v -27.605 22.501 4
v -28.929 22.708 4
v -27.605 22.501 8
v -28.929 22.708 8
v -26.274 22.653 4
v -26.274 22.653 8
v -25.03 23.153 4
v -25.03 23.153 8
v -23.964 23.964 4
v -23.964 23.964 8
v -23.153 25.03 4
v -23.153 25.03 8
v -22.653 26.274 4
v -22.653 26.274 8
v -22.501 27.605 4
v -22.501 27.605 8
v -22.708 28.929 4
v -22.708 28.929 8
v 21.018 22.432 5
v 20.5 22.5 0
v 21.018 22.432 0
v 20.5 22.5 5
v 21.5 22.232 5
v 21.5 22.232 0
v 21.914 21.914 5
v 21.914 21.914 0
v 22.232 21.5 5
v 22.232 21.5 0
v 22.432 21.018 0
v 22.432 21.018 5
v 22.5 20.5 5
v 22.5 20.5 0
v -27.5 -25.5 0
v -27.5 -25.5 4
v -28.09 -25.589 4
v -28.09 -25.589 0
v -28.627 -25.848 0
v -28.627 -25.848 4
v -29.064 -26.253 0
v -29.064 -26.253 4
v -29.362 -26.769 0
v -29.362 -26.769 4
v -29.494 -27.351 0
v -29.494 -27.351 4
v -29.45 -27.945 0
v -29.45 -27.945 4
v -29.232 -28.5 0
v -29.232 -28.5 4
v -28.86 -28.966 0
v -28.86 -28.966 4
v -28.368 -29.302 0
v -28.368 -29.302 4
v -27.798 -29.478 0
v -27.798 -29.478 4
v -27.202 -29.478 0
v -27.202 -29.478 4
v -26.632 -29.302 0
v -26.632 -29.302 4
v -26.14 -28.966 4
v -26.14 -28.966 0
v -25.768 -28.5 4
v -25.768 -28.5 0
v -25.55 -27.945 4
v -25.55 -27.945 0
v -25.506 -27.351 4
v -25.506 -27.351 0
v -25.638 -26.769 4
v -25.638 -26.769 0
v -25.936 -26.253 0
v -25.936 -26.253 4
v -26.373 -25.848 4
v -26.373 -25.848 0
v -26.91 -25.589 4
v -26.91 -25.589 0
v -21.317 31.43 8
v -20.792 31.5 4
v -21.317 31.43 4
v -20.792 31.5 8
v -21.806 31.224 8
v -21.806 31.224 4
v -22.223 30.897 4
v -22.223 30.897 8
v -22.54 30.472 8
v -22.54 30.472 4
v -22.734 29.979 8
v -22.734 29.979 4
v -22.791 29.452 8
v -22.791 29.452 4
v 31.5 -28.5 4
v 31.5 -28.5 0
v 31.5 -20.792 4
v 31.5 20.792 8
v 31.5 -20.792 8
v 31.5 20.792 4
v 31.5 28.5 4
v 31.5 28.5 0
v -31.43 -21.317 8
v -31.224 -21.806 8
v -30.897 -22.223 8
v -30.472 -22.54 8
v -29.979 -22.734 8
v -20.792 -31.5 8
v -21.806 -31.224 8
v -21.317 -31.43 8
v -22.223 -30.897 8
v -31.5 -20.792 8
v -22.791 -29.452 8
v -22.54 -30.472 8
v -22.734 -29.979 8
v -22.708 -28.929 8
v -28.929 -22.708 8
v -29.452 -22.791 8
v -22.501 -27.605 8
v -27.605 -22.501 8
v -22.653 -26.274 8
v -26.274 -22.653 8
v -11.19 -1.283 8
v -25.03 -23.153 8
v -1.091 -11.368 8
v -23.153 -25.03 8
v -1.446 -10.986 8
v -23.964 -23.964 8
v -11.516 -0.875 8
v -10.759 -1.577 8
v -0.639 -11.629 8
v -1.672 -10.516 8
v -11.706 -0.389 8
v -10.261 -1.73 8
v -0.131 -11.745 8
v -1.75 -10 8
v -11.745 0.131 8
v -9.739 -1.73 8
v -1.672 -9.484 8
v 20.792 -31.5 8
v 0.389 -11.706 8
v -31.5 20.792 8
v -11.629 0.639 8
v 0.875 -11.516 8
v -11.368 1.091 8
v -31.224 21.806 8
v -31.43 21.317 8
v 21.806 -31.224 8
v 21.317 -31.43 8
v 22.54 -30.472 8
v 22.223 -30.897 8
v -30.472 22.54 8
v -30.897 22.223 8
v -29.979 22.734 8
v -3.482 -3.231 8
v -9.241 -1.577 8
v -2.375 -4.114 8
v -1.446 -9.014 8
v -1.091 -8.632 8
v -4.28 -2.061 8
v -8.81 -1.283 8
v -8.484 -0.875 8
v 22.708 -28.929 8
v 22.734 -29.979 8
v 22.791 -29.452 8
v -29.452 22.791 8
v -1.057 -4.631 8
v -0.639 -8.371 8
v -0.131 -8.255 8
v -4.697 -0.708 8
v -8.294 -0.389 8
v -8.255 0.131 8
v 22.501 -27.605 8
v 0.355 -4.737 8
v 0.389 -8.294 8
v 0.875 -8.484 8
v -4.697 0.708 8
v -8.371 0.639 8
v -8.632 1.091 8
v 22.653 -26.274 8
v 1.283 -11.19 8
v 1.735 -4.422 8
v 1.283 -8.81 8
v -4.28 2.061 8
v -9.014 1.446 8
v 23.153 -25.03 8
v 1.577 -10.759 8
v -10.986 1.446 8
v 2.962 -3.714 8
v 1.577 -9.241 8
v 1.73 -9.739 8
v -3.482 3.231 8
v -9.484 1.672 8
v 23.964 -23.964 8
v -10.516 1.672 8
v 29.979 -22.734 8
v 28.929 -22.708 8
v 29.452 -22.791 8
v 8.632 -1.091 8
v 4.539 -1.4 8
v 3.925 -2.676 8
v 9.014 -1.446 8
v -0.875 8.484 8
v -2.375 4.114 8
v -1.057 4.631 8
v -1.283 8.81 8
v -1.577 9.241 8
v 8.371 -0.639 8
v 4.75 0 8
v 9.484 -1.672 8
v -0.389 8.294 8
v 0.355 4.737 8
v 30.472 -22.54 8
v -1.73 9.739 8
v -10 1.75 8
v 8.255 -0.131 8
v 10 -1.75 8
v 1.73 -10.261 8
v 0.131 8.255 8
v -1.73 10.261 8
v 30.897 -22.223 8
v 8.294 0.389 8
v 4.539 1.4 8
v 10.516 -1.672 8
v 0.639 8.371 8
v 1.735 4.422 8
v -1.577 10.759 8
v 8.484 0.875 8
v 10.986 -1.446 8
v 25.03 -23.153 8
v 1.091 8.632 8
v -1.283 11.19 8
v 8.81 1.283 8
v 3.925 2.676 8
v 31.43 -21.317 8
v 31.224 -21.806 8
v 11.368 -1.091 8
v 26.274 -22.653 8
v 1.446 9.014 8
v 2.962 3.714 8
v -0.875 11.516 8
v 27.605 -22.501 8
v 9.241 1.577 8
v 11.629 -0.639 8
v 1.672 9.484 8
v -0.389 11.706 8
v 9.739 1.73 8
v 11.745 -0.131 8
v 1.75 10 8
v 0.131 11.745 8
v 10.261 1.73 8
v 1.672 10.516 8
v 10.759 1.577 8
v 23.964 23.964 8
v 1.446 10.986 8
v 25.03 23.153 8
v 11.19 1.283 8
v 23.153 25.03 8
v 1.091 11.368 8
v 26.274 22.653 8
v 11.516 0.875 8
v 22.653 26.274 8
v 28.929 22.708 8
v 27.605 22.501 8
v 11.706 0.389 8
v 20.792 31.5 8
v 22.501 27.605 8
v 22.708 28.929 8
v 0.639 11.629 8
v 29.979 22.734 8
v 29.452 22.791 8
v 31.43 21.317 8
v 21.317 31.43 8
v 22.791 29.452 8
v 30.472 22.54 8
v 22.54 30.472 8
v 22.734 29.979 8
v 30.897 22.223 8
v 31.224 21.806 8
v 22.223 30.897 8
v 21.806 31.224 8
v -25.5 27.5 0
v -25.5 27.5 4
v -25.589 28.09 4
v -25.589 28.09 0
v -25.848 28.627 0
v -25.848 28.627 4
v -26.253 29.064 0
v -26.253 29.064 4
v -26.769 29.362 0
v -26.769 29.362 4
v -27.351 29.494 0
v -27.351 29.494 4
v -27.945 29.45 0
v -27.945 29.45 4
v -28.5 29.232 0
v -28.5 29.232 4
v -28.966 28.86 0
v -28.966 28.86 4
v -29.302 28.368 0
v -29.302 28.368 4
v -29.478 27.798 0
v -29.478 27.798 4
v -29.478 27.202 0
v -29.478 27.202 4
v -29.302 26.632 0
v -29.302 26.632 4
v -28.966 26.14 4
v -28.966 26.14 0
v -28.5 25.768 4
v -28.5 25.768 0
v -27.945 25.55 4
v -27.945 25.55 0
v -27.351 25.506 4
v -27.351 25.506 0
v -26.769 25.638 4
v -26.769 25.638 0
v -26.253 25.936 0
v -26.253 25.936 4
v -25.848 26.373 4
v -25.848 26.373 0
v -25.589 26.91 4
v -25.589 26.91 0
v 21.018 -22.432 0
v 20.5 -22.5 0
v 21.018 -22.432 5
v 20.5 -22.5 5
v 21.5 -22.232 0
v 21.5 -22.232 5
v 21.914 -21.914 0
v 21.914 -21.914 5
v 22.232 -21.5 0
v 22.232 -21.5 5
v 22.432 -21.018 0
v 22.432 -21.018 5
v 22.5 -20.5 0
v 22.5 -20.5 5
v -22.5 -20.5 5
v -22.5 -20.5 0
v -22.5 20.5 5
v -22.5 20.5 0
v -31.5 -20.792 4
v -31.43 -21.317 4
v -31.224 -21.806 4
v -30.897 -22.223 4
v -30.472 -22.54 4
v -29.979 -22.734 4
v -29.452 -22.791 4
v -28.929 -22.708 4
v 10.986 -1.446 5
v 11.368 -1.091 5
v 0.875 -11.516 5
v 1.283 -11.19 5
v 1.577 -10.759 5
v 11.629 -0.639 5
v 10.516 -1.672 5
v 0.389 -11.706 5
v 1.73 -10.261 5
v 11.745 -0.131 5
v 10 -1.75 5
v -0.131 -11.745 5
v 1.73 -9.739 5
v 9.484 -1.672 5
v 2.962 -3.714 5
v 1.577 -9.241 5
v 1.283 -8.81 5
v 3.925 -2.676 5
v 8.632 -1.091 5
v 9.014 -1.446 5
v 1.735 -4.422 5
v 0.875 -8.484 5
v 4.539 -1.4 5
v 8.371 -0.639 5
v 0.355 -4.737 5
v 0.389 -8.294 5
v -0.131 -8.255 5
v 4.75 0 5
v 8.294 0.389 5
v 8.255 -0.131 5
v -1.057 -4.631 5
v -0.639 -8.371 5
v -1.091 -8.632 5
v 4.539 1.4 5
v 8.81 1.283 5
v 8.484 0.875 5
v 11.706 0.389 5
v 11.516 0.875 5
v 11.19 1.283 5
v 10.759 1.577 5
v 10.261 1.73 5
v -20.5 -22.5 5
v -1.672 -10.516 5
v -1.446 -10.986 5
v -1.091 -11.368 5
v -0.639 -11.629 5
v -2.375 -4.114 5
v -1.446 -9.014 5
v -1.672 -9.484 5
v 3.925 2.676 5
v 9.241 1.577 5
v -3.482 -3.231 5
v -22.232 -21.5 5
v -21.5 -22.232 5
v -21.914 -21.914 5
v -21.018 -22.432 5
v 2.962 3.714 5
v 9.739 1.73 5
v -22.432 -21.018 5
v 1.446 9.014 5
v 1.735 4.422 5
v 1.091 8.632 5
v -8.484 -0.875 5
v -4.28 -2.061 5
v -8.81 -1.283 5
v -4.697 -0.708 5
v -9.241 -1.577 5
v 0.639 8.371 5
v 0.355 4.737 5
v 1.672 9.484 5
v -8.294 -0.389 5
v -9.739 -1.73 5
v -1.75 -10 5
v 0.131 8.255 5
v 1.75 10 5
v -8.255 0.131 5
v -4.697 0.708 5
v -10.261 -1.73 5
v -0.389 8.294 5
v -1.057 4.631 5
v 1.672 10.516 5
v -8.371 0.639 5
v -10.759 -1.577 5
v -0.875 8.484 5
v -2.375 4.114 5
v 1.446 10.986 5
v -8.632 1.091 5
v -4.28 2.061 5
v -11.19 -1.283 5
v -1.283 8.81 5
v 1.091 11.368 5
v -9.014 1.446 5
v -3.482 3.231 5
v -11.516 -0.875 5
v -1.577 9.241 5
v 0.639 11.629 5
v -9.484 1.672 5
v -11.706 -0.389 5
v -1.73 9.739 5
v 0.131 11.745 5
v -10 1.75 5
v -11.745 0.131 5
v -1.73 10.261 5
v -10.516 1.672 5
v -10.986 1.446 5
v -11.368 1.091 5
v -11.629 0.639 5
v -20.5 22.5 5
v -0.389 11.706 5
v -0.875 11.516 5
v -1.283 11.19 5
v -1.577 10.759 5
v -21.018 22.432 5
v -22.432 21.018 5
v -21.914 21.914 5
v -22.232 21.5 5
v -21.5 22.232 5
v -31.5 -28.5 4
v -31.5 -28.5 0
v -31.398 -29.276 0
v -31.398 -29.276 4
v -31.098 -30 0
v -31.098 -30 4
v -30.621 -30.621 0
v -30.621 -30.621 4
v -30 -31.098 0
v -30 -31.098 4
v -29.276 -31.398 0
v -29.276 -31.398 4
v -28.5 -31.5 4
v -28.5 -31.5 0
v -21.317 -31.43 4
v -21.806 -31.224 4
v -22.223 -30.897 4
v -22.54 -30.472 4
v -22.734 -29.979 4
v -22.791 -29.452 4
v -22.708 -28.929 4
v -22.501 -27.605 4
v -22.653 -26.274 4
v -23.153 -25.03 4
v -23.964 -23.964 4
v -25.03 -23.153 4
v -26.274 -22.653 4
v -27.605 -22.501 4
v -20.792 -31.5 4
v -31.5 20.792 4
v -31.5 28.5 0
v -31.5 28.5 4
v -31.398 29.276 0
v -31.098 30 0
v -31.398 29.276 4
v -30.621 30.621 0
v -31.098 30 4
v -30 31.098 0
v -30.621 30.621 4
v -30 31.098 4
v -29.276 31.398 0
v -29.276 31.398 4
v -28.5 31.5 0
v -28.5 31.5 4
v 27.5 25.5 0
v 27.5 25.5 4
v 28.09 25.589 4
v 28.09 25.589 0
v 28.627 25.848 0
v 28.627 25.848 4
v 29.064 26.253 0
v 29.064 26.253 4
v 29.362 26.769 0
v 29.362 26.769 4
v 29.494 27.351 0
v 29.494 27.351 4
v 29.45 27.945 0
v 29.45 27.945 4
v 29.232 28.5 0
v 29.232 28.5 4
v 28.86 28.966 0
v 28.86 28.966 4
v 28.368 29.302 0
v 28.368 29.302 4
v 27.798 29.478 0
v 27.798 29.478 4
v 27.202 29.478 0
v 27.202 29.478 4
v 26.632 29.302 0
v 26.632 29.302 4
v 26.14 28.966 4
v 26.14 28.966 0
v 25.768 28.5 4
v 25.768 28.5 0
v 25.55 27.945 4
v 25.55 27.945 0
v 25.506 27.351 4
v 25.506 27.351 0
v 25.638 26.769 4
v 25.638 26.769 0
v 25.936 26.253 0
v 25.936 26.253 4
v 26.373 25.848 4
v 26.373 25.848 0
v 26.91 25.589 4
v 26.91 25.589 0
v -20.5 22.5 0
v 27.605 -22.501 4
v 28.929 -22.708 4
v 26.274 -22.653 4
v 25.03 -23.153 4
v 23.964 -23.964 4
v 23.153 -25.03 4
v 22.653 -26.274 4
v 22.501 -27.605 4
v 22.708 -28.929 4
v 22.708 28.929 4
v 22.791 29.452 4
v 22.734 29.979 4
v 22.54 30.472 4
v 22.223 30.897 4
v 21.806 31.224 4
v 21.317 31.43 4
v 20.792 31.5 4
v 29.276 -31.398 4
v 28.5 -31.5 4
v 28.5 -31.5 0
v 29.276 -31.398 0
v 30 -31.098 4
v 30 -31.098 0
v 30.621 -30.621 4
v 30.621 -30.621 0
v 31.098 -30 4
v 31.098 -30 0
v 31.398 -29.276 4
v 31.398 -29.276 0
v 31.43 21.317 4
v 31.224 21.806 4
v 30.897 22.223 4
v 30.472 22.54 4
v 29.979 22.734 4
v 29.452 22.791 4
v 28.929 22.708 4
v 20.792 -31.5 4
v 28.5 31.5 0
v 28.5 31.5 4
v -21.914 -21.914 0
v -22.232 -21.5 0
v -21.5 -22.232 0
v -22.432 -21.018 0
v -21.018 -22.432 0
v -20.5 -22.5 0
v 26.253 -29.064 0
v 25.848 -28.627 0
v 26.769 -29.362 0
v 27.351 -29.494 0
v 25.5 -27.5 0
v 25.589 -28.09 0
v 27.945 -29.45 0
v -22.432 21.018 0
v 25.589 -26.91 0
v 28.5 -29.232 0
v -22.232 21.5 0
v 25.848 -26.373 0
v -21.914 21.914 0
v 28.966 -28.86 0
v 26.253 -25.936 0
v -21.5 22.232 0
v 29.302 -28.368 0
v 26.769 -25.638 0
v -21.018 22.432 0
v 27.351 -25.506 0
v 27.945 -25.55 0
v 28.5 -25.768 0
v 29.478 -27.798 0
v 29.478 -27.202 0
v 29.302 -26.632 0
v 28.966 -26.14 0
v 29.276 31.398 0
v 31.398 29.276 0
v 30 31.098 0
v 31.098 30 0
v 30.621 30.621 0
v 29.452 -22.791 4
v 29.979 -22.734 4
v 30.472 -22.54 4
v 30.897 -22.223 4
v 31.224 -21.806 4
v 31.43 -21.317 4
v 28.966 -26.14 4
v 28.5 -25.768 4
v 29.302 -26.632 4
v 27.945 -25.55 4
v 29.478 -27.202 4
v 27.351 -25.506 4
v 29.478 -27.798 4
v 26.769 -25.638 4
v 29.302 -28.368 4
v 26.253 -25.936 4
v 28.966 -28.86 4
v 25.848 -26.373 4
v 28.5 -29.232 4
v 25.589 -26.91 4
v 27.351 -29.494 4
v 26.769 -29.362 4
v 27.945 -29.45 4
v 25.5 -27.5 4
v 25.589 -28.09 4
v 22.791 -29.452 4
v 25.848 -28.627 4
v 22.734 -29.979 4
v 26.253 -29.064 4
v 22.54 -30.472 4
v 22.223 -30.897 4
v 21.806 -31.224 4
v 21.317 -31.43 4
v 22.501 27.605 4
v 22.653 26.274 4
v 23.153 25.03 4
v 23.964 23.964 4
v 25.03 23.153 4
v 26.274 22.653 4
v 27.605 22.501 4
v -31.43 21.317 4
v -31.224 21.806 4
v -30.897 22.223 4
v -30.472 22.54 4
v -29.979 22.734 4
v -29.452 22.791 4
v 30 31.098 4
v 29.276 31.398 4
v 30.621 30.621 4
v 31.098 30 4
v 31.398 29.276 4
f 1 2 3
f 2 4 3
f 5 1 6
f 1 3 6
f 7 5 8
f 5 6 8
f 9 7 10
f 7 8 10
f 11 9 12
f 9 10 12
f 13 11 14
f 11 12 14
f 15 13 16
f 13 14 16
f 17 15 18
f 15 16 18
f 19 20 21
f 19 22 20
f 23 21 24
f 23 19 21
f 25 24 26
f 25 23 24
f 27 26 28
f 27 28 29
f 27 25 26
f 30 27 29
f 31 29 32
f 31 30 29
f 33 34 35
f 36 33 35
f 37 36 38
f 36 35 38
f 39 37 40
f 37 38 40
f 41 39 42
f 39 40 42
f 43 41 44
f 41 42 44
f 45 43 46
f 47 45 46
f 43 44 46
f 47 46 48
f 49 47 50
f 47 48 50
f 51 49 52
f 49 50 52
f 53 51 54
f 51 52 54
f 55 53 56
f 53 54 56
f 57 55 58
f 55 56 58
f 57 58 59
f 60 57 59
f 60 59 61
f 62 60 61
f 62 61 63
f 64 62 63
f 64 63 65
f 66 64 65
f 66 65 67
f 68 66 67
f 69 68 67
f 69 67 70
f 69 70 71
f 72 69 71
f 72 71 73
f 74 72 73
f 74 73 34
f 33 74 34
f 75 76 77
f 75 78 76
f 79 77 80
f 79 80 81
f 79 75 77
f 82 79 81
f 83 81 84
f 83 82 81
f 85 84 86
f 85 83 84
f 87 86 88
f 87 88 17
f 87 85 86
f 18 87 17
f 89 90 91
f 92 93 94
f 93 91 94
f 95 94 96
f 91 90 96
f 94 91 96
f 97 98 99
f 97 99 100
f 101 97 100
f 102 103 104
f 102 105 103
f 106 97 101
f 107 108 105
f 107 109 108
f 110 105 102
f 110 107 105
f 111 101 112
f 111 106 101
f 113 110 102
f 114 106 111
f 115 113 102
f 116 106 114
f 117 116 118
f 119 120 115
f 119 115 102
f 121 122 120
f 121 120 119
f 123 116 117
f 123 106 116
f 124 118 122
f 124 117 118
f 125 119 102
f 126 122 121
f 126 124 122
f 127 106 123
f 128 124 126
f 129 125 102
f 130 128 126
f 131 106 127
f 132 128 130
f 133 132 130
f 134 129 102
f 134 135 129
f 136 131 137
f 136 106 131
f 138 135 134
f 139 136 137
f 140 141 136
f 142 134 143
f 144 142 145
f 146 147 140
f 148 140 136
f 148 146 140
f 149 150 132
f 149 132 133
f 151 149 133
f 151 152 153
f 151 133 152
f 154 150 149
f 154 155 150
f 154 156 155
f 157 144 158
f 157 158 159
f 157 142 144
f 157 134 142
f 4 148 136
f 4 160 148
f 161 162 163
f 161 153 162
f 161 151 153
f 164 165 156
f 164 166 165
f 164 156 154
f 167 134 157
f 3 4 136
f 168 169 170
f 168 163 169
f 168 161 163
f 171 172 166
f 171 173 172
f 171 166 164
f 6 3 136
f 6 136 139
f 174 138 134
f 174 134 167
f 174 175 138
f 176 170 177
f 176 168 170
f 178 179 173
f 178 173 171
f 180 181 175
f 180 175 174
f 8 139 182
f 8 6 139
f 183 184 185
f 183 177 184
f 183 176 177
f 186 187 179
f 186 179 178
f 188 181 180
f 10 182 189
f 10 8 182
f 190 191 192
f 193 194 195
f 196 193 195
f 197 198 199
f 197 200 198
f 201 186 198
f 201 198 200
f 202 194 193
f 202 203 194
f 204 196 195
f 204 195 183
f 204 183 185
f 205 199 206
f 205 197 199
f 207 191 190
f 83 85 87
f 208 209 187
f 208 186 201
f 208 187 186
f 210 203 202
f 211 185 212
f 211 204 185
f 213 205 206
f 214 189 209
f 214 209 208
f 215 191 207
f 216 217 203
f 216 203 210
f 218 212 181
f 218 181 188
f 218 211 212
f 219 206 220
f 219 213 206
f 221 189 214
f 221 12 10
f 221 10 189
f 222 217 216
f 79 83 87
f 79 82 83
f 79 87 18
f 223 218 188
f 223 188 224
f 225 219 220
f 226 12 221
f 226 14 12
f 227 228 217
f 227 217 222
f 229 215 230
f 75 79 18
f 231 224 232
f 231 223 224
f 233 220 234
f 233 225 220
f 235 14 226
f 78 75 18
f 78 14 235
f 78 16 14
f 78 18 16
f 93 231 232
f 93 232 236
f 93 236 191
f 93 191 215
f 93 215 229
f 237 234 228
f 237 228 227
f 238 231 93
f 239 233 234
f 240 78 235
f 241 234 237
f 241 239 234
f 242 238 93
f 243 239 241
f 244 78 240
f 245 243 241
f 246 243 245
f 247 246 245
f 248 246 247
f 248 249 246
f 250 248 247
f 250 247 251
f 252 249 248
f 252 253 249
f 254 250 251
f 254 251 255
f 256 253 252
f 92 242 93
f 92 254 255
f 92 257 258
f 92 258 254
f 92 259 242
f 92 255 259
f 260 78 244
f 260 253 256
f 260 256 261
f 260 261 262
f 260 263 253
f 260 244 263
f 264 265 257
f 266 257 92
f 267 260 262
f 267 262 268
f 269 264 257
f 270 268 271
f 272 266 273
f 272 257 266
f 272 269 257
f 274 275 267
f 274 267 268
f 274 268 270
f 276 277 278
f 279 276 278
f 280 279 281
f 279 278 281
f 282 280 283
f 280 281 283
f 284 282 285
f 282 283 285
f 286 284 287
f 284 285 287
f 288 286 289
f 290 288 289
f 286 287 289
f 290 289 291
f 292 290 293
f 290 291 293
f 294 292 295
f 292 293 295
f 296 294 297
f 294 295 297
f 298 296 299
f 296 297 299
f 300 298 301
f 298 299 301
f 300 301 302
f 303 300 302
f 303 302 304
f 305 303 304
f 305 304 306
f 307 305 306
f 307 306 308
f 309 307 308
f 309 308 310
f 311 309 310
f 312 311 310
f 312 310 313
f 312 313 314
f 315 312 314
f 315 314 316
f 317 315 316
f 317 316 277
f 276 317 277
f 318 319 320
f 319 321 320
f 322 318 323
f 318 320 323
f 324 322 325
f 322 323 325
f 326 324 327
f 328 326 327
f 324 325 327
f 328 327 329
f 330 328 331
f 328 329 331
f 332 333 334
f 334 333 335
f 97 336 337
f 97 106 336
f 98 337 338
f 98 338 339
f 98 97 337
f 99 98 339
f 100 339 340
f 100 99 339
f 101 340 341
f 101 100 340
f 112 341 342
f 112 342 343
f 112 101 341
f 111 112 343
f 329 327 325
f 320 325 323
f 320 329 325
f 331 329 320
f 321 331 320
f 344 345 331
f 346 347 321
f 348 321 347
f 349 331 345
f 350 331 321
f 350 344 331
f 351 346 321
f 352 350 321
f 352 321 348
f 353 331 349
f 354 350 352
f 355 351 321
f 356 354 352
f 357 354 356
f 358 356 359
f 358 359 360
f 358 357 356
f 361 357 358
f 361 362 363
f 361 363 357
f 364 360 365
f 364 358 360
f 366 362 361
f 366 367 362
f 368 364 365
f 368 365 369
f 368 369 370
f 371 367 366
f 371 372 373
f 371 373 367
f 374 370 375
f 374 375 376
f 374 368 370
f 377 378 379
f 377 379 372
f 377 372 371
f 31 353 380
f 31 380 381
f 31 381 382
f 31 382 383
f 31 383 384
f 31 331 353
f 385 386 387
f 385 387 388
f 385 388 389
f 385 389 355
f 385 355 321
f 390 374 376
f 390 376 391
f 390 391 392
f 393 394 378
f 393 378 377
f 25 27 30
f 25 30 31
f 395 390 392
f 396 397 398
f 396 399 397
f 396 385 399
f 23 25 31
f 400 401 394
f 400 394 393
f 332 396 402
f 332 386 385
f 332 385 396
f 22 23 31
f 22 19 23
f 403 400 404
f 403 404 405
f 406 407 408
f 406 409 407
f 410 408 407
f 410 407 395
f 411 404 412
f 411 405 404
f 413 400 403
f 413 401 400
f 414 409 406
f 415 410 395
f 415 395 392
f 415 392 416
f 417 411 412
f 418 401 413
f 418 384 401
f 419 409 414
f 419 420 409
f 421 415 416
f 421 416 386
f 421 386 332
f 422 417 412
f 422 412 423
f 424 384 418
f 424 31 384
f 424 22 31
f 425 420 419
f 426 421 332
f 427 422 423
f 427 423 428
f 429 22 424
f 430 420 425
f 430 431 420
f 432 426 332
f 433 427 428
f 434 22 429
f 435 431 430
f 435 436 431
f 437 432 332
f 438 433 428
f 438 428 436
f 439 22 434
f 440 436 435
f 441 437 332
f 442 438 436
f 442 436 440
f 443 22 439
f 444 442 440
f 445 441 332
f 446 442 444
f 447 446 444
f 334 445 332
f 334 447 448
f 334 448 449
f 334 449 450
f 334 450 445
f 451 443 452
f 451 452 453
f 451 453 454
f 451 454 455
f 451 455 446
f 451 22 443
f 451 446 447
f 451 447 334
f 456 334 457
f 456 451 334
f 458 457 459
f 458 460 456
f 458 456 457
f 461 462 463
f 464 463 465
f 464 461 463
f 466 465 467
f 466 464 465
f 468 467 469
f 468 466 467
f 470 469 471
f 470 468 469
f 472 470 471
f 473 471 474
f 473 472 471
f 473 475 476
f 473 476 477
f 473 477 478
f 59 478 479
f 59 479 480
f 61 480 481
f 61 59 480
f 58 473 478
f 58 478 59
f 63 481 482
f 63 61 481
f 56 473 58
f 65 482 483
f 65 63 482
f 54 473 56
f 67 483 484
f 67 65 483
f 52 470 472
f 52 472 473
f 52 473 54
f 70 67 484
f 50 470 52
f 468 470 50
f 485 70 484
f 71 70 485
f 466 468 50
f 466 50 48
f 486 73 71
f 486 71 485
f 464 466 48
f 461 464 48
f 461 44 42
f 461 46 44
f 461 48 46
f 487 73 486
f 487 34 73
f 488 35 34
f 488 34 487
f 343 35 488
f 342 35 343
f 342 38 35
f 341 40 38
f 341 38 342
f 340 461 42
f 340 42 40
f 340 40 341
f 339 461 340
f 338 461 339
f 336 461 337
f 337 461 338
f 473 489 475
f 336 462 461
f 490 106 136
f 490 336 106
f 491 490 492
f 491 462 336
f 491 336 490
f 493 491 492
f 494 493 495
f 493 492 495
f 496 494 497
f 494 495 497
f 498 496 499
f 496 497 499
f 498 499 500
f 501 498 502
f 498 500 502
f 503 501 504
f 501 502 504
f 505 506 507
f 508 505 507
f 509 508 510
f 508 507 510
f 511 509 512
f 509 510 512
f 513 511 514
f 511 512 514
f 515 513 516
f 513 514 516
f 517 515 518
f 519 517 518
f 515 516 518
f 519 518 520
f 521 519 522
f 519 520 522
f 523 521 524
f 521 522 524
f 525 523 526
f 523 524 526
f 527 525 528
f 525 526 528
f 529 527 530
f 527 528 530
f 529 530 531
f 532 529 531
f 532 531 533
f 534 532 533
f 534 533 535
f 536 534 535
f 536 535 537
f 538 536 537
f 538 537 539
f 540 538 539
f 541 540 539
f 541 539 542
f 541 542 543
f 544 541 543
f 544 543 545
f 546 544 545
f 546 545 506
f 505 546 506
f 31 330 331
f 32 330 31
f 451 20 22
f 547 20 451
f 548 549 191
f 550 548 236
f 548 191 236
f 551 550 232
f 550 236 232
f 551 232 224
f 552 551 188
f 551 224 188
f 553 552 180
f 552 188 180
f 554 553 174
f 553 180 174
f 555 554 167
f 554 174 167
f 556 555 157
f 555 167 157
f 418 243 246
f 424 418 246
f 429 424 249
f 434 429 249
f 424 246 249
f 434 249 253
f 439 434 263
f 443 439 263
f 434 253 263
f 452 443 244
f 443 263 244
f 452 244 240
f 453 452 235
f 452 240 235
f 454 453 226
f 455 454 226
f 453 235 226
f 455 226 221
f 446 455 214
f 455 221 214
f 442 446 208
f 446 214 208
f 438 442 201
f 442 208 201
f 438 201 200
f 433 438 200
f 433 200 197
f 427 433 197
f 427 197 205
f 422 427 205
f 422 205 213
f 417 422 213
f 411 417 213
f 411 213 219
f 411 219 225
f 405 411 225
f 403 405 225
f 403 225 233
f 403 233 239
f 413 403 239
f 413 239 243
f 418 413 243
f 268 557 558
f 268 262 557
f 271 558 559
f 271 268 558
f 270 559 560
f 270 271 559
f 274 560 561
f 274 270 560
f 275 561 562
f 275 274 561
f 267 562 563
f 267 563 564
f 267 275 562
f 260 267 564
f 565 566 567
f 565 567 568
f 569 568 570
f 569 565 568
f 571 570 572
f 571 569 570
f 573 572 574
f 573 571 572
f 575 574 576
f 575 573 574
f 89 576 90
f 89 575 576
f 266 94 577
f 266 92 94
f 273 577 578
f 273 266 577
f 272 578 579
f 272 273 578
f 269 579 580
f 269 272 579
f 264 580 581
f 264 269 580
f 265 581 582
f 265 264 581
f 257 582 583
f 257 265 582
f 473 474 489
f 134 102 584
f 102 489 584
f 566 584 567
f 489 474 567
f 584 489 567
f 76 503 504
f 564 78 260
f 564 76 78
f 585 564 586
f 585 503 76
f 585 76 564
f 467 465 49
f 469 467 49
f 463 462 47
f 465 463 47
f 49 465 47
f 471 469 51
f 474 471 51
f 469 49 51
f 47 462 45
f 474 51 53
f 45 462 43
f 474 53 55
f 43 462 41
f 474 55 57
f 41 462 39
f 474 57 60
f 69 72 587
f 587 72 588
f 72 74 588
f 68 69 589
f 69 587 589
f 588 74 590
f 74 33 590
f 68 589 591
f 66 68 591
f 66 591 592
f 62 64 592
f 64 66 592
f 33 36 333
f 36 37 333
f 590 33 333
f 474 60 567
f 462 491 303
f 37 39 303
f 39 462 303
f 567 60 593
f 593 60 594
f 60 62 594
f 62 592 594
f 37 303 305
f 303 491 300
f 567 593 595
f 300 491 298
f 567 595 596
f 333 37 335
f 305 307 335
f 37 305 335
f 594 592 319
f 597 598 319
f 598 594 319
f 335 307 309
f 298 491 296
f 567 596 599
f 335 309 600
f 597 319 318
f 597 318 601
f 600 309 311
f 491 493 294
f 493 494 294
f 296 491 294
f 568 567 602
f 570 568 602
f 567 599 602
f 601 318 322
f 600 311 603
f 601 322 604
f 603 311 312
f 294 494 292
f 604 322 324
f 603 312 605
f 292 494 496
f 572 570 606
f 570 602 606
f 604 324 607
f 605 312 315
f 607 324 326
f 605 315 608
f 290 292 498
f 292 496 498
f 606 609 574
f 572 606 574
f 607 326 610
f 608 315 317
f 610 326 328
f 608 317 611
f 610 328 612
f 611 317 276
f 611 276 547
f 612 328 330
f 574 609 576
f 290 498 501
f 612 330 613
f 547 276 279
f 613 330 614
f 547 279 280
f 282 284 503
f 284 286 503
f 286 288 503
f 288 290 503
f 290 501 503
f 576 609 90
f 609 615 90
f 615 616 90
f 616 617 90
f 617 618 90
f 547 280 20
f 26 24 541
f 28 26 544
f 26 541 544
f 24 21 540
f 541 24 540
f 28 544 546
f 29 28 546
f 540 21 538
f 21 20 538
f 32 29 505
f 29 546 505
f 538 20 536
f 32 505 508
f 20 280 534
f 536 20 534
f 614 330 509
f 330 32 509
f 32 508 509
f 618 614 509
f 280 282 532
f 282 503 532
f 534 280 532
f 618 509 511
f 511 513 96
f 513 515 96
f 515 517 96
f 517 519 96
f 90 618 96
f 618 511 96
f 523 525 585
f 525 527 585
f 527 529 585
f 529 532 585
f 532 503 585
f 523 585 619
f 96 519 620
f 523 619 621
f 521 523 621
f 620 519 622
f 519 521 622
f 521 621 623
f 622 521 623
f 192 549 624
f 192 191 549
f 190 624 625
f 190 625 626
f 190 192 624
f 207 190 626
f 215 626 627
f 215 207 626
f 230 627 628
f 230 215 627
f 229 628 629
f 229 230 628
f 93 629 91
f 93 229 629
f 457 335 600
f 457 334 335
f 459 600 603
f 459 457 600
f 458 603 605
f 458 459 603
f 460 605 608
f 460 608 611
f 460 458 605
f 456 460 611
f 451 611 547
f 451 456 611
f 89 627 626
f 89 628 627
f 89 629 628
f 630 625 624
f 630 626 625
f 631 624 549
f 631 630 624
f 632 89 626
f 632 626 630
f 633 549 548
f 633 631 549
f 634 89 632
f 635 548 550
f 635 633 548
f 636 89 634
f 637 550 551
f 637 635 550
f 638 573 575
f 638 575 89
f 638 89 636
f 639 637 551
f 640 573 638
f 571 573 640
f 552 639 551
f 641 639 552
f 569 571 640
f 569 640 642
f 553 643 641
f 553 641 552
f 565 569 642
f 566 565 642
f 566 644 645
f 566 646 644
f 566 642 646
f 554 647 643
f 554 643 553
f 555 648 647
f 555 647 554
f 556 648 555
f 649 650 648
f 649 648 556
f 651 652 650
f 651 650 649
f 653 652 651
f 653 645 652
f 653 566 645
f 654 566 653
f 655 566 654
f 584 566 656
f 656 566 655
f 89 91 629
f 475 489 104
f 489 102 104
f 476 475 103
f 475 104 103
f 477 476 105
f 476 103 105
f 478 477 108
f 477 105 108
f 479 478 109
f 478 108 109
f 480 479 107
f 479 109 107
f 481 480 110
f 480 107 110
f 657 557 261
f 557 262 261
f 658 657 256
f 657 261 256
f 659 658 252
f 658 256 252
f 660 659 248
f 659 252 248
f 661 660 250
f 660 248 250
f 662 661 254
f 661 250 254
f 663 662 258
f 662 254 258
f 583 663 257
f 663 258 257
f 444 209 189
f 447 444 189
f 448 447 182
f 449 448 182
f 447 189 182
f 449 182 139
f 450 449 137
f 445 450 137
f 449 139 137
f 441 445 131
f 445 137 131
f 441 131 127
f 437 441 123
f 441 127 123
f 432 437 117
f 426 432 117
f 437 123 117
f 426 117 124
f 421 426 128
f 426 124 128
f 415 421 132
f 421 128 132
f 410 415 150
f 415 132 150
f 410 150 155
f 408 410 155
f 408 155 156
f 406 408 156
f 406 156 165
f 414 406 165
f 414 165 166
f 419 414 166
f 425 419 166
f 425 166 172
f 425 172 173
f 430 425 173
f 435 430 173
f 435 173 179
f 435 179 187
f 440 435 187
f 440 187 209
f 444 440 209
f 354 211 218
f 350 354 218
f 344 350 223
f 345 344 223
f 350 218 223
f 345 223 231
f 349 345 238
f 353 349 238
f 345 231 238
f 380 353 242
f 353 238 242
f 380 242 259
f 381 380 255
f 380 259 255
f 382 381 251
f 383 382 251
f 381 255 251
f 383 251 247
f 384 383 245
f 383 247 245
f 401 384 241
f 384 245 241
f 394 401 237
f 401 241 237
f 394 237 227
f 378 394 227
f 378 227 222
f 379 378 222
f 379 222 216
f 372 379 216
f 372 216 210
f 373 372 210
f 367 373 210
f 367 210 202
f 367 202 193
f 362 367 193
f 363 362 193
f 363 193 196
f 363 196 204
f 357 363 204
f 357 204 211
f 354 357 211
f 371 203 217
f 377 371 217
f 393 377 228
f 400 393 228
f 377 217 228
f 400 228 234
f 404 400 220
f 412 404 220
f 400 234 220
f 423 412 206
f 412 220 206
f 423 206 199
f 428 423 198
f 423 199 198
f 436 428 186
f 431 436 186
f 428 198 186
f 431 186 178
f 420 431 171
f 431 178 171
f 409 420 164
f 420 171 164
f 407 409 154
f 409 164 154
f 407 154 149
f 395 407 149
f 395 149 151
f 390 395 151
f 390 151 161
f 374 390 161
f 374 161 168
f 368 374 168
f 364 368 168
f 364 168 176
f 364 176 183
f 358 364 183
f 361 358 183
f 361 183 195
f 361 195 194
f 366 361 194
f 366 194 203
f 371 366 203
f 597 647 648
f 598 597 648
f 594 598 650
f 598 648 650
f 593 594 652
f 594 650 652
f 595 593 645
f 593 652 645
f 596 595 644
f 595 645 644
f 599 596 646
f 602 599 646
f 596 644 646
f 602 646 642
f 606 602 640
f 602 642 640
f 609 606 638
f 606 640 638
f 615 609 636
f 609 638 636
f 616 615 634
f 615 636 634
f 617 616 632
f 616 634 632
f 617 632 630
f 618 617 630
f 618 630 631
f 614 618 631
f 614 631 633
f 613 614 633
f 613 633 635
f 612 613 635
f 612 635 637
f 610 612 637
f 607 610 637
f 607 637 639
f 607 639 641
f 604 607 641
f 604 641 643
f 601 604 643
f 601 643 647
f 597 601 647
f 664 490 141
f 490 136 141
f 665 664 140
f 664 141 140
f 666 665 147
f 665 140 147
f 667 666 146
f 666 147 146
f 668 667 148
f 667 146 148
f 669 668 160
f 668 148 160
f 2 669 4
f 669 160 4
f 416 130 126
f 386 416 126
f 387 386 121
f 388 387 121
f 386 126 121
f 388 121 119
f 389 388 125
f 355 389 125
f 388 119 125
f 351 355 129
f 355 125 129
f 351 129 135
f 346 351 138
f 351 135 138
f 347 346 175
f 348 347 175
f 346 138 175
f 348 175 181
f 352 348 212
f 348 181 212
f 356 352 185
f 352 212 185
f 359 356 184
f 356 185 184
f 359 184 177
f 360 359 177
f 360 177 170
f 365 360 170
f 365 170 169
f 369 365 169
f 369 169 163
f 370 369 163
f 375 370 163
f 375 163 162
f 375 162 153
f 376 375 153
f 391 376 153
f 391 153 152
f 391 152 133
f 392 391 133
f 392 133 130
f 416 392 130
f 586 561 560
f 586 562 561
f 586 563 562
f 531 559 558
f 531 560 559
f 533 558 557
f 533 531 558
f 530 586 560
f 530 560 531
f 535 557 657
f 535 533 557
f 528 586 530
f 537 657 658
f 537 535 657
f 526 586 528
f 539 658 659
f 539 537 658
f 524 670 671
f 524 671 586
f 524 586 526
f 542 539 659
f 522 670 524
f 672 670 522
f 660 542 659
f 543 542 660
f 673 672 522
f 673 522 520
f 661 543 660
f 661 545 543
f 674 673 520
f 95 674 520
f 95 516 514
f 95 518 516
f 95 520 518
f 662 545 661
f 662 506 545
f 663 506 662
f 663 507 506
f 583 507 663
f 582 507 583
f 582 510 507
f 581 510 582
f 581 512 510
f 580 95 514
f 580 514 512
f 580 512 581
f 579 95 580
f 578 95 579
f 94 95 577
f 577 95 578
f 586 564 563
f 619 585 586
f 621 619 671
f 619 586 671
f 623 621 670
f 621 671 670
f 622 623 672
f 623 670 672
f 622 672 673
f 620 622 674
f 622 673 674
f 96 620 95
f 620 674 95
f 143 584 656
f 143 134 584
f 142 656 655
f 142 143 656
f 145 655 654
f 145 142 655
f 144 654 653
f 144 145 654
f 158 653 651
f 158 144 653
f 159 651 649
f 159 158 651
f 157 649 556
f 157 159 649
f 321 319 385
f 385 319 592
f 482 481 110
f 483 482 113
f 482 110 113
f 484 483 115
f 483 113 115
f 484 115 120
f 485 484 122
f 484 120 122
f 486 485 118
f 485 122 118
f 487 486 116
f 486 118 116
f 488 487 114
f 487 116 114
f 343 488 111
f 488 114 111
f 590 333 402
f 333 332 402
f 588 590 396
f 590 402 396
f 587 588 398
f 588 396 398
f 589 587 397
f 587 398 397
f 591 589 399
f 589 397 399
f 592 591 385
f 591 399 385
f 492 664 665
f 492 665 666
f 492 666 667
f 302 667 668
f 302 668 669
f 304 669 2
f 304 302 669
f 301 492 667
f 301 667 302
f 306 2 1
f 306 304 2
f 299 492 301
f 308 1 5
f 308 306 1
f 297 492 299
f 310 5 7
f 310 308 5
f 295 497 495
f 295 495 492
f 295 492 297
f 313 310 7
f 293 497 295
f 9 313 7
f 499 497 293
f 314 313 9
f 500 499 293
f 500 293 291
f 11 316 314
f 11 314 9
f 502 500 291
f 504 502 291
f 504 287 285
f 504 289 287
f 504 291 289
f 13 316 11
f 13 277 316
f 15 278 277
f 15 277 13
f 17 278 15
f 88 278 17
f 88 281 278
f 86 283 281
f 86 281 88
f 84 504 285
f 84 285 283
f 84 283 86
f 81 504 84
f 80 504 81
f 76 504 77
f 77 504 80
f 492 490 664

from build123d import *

# Parameters (mm, degrees)
SKETCH1_W           = 63
SKETCH1_H           = 63
BOSS_EXTRUDE1_DEPTH = 8
SKETCH2_W           = 45
SKETCH2_H           = 45
CUT_EXTRUDE1_DEPTH  = 5
SKETCH3_R           = 4.75
CUT_EXTRUDE2_DEPTH  = 5
SKETCH4_R           = 1.75
CUT_EXTRUDE3_DEPTH  = 5
CIRPATTERN1_COUNT   = 4
SKETCH5_R           = 2
CUT_EXTRUDE4_DEPTH  = 15
CIRPATTERN2_COUNT   = 4
FILLET1_R           = 3
SKETCH6_R           = 5
CUT_EXTRUDE5_DEPTH  = 4
CIRPATTERN3_COUNT   = 4
FILLET2_R           = 2
FILLET3_R           = 2


with BuildPart() as part:
    # Sketch1 → Boss-Extrude1 (new body)
    with BuildSketch(Plane.XY):
        Rectangle(SKETCH1_W, SKETCH1_H)
    extrude(amount=BOSS_EXTRUDE1_DEPTH)

    # Sketch2 → Cut-Extrude1 (cut)
    with BuildSketch(Plane(origin=(0, 0, 0), x_dir=(-1, 0, 0), z_dir=(0, 0, -1))):
        Rectangle(SKETCH2_W, SKETCH2_H)
    extrude(amount=-CUT_EXTRUDE1_DEPTH, mode=Mode.SUBTRACT)

    # Sketch3 → Cut-Extrude2 (cut)
    with BuildSketch(Plane.XY.offset(8)):
        Circle(SKETCH3_R)
    extrude(amount=-CUT_EXTRUDE2_DEPTH, mode=Mode.SUBTRACT)

    # Sketch4 → Cut-Extrude3 (cut)
    with BuildSketch(Plane.XY.offset(8)):
        with Locations((0, 10)):
            Circle(SKETCH4_R)
    cut_extrude3 = extrude(amount=-CUT_EXTRUDE3_DEPTH, mode=Mode.SUBTRACT)

    # CirPattern1: Cut-Extrude3 ×4 about axis
    cirpattern1_axis = Axis((0, 0, 0), (0, 0, 1))
    for i in range(1, CIRPATTERN1_COUNT):
        add(cut_extrude3.rotate(cirpattern1_axis, i * 360 / CIRPATTERN1_COUNT), mode=Mode.SUBTRACT)

    # Sketch5 → Cut-Extrude4 (cut)
    with BuildSketch(Plane.XY.offset(8)):
        with Locations((-27.5, 27.5)):
            Circle(SKETCH5_R)
    cut_extrude4 = extrude(amount=-CUT_EXTRUDE4_DEPTH, mode=Mode.SUBTRACT)

    # CirPattern2: Cut-Extrude4 ×4 about axis
    cirpattern2_axis = Axis((0, 0, 0), (0, 0, 1))
    for i in range(1, CIRPATTERN2_COUNT):
        add(cut_extrude4.rotate(cirpattern2_axis, i * 360 / CIRPATTERN2_COUNT), mode=Mode.SUBTRACT)

    # Fillet1
    fillet1_edges = [part.edges().sort_by_distance(p)[0] for p in [
        (-31.5, 31.5, 4),
        (31.5, 31.5, 4),
        (31.5, -31.5, 4),
        (-31.5, -31.5, 4),
    ]]
    fillet(fillet1_edges, radius=FILLET1_R)

    # Sketch6 → Cut-Extrude5 (cut)
    with BuildSketch(Plane.XY.offset(8)):
        with Locations((-27.5, 27.5)):
            Circle(SKETCH6_R)
    cut_extrude5 = extrude(amount=-CUT_EXTRUDE5_DEPTH, mode=Mode.SUBTRACT)

    # CirPattern3: Cut-Extrude5 ×4 about axis
    cirpattern3_axis = Axis((0, 0, 0), (0, 0, 1))
    for i in range(1, CIRPATTERN3_COUNT):
        add(cut_extrude5.rotate(cirpattern3_axis, i * 360 / CIRPATTERN3_COUNT), mode=Mode.SUBTRACT)

    # Fillet2
    fillet2_edges = [part.edges().sort_by_distance(p)[0] for p in [
        (-31.5, 24.5, 6),
        (-24.5, 31.5, 6),
        (31.5, 24.5, 6),
        (24.5, 31.5, 6),
        (24.5, -31.5, 6),
        (31.5, -24.5, 6),
        (-31.5, -24.5, 6),
        (-24.5, -31.5, 6),
    ]]
    fillet(fillet2_edges, radius=FILLET2_R)

    # Fillet3
    fillet3_edges = [part.edges().sort_by_distance(p)[0] for p in [
        (22.5, -22.5, 2.5),
        (22.5, 22.5, 2.5),
        (-22.5, 22.5, 2.5),
        (-22.5, -22.5, 2.5),
    ]]
    fillet(fillet3_edges, radius=FILLET3_R)


solid = part.part
